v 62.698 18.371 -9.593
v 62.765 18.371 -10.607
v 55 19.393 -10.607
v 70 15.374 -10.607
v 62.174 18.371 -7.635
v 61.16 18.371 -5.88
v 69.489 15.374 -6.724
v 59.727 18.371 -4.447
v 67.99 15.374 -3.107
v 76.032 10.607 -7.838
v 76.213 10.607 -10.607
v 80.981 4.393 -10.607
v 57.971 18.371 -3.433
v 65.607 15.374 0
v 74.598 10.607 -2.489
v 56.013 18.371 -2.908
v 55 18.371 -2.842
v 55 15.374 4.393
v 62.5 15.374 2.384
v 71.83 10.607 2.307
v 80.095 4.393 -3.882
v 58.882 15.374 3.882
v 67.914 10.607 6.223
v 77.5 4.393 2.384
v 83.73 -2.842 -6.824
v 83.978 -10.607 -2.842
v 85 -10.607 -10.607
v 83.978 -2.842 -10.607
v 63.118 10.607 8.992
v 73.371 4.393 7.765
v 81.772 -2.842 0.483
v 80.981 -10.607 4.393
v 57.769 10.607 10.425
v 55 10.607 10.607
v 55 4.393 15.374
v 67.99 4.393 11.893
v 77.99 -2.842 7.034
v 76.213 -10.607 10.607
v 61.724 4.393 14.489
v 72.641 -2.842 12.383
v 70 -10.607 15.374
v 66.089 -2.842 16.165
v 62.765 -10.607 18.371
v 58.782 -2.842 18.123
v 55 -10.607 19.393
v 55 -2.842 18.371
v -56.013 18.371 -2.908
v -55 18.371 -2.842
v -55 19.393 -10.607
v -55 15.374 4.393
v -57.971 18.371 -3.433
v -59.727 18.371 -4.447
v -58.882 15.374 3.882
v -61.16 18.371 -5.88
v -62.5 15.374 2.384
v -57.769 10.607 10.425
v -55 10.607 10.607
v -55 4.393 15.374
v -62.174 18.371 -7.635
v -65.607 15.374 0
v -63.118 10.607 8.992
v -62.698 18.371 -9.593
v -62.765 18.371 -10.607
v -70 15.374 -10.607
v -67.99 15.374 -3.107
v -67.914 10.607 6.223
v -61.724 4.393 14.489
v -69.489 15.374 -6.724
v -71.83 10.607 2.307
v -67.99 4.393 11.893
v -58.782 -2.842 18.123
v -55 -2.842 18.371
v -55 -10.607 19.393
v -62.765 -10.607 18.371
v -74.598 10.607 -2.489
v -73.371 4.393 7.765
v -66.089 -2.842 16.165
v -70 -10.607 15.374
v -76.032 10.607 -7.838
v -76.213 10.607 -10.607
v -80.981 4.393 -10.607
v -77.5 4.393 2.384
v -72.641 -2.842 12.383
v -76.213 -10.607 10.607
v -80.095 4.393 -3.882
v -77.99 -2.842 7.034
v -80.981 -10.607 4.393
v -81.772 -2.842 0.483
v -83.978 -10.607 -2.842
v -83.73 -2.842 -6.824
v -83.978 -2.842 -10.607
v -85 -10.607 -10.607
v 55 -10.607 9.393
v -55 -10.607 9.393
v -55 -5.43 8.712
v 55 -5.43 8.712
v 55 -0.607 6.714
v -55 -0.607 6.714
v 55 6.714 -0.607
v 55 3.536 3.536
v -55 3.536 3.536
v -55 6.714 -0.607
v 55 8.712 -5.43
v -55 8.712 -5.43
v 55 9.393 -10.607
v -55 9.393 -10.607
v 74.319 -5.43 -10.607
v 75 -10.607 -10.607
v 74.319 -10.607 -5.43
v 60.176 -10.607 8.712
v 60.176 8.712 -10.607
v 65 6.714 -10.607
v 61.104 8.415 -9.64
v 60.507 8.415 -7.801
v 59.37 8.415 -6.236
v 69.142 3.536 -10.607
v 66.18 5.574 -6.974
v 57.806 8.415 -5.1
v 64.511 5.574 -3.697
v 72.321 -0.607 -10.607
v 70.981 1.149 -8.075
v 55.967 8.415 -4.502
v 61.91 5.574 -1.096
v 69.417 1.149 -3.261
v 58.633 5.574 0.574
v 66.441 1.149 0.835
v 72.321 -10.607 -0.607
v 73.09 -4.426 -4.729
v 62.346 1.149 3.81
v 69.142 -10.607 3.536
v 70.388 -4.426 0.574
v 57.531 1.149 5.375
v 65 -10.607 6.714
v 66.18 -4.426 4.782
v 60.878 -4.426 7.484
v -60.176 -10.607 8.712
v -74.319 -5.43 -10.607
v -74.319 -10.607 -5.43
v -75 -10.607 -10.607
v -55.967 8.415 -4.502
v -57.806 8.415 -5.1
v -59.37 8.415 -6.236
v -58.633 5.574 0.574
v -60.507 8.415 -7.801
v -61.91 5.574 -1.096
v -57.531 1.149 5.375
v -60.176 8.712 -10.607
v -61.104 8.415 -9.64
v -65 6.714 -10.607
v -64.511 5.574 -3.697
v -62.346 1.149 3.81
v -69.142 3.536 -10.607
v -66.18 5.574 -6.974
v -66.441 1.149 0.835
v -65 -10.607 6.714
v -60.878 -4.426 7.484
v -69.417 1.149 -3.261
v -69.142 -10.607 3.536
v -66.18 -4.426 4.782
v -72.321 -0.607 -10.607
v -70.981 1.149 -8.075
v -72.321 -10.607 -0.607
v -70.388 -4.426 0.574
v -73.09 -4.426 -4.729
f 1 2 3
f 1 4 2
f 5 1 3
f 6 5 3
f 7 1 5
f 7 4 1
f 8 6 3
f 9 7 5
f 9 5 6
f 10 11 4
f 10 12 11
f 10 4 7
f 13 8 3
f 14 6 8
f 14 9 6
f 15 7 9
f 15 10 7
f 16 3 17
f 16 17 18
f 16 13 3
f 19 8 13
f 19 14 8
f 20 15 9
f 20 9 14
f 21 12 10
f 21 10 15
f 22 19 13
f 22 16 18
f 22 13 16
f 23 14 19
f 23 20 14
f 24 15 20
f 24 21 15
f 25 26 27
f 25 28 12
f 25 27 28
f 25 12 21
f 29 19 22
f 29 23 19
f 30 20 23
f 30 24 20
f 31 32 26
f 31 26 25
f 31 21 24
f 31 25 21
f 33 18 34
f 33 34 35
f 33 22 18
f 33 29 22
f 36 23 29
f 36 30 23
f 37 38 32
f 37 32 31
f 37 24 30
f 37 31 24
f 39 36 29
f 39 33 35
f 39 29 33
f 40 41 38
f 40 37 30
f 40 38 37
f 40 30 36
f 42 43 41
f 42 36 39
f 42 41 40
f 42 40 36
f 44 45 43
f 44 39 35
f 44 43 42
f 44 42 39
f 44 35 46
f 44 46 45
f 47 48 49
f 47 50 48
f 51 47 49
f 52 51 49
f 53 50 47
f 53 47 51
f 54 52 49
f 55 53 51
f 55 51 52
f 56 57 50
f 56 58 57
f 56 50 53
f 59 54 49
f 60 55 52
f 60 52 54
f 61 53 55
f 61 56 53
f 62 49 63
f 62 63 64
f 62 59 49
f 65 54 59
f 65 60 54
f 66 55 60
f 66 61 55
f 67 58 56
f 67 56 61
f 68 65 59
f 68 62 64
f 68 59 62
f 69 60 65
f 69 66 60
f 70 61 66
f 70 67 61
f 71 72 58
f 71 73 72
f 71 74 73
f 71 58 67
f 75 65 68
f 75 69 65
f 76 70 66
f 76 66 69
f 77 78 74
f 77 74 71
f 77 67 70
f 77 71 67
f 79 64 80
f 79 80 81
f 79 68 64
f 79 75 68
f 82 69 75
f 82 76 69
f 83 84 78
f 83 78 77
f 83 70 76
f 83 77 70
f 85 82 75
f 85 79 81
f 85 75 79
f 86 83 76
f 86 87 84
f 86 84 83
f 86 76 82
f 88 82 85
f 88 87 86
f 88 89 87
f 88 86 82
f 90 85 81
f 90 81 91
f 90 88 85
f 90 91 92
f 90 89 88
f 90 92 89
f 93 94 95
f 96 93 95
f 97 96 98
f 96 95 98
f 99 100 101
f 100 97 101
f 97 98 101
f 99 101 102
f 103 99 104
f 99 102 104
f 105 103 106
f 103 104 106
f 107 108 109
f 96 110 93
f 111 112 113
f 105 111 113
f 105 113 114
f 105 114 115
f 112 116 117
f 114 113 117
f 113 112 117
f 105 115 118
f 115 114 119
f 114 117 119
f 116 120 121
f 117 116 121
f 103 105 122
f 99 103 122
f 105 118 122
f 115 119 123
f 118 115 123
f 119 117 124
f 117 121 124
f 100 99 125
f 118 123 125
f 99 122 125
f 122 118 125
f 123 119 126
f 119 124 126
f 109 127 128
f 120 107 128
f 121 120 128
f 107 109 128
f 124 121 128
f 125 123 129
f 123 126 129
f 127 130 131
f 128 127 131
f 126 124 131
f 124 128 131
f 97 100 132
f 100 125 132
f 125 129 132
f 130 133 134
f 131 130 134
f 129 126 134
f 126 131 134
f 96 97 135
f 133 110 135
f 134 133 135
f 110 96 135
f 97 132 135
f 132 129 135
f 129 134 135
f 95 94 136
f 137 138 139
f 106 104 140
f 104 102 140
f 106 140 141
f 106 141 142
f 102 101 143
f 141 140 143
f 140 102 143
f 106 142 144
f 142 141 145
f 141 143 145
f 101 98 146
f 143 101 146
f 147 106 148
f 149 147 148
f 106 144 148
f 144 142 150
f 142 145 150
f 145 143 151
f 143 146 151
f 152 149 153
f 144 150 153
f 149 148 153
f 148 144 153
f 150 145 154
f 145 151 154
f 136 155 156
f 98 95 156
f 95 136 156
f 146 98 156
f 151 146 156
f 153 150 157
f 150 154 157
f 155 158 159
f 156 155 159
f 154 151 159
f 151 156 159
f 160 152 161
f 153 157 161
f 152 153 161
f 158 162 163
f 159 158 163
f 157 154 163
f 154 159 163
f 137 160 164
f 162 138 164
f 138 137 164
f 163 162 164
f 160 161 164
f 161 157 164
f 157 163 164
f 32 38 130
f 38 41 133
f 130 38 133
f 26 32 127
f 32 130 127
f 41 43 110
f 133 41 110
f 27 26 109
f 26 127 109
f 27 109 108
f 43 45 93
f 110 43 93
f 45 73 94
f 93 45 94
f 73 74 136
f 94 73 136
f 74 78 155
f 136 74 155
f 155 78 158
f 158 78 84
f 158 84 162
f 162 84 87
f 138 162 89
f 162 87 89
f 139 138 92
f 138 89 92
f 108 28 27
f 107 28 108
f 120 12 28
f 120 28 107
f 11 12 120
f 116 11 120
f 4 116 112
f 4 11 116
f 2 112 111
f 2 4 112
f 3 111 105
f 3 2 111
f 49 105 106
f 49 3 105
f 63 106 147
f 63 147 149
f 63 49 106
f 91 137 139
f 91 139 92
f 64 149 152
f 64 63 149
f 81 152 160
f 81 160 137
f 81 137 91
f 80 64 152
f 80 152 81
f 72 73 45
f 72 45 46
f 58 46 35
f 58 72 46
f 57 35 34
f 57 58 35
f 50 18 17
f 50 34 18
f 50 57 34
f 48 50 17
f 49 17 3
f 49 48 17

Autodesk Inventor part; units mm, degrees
sketch "Эскиз3" plane through (0, 0, 0) normal (1, 0, 0) x (0, 1, 0)
  line L0 (-10.6066, -10.6066) -> (-10.6066, 19.3934)
  line L1 (-10.6066, -10.6066) -> (19.3934, -10.6066)
  arc A0 (19.3934, -10.6066) -> (-10.6066, 19.3934) centre (-10.6066, -10.6066) ccw
  line L2 (-10.6066, -10.6066) -> (10.6066, 10.6066) construction
  point P0 (0, 0)
  point P1 (0, 0)
  dimension "d9" = 30
extrude "Выдавливание3" add sketch "Эскиз3" along normal mid plane 110
sketch "Эскиз4" plane through (55, 0, 0) normal (1, 0, 0) x (0, 0, -1)
  line L0 (-19.3934, -10.6066) -> (10.6066, -10.6066) projected
  line L1 (10.6066, -10.6066) -> (10.6066, 19.3934) projected
  arc A0 (10.6066, 19.3934) -> (-19.3934, -10.6066) centre (10.6066, -10.6066) ccw projected
  point P0 (0, 0)
revolve "Вращение1" add sketch "Эскиз4" angle 90 about axis through (55, -10.6066, -10.6066) along (0, 1, 0)
mirror "Зеркальное отражение1" about plane through (0, 0, 0) normal (1, 0, 0) of "Вращение1"
shell "Оболочка2" thickness 10 removed faces 2 at (18.3333, -10.6066, -0.6066) at (18.3333, -0.6066, -10.6066)
properties part number "Козырёк_для_камеры"
